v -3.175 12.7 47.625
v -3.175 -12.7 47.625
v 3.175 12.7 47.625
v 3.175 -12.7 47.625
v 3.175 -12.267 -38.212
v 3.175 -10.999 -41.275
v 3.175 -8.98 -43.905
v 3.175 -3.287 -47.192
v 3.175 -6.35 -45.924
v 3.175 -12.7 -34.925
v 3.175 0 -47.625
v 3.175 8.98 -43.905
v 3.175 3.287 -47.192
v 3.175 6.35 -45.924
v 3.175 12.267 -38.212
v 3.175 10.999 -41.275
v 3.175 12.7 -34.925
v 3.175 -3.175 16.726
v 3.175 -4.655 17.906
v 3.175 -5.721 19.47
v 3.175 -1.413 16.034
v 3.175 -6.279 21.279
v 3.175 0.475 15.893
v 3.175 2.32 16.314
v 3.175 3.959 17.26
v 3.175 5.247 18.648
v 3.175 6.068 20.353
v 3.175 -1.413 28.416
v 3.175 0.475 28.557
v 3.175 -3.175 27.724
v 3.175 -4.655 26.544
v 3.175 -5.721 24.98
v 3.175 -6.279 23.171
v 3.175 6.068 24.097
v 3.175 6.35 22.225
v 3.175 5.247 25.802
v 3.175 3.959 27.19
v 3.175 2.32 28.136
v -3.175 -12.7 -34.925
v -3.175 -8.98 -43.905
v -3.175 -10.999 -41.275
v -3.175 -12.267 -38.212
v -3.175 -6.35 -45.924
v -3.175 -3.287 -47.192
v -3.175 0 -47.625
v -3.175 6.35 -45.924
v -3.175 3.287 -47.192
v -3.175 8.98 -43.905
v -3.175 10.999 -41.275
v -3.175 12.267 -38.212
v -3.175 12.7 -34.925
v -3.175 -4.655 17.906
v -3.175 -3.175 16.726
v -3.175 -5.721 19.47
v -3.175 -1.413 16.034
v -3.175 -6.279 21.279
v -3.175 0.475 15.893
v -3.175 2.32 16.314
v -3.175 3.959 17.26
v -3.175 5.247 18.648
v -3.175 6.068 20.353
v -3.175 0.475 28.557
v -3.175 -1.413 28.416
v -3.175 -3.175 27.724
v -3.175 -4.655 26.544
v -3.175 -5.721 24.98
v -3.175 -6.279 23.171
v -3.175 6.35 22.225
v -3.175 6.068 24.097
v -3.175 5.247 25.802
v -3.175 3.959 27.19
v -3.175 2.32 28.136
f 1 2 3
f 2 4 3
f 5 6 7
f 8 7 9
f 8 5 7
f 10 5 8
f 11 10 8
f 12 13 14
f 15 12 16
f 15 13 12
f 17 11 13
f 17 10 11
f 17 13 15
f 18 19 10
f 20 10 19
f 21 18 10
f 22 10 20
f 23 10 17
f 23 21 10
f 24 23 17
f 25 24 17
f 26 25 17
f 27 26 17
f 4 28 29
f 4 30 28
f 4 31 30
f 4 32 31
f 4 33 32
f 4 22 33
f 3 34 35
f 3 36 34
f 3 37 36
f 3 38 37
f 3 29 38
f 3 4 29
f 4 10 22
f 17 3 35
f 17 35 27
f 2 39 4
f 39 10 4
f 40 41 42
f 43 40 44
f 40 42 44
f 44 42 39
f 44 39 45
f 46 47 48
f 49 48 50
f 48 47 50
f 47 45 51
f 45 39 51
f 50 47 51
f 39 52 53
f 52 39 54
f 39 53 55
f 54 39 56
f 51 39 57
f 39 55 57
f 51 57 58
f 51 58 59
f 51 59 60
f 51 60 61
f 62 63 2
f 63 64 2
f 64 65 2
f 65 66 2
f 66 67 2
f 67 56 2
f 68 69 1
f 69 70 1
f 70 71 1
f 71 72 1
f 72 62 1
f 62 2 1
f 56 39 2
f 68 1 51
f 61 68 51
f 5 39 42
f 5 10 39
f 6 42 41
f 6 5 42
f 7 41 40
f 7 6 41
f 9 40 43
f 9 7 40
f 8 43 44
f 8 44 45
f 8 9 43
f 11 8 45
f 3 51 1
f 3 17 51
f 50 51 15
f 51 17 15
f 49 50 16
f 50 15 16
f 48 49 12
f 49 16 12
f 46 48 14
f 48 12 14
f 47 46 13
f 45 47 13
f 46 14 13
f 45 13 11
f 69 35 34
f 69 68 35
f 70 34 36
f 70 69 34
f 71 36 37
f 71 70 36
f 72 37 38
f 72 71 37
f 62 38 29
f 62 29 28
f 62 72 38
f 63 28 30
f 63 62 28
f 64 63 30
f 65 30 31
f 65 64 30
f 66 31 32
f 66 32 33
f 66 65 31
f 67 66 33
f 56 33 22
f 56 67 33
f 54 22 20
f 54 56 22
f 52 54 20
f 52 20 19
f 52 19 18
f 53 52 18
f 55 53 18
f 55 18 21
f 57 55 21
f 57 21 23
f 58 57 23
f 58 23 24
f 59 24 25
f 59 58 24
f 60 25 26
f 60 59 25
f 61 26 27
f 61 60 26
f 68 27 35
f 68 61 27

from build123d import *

# Parameters (mm, degrees)
F0_W     = 25.4
F0_H     = 95.25
F0_R     = 6.35
F1_DEPTH = 3.175
F2_R     = 12.69999


# Not quite as in the source:
# - a fillet or chamfer is up to 0.001 mm smaller than in the source, because OpenCascade refuses the exact size


with BuildPart() as f1:
    # F0 (on Right) → F1 (new body, symmetric)
    with BuildSketch(Plane.YZ):
        Rectangle(F0_W, F0_H)
        with Locations((0, 22.225)):
            Circle(F0_R, mode=Mode.SUBTRACT)
    extrude(amount=F1_DEPTH, both=True)

    # F2 (radius 12.7 in the source; OpenCascade refuses exactly that, so slightly less here)
    f2_edges = [f1.edges().sort_by_distance(p)[0] for p in [
        (0, 12.7, -47.625),
        (0, -12.7, -47.625),
    ]]
    fillet(f2_edges, radius=F2_R)


solid = f1.part
